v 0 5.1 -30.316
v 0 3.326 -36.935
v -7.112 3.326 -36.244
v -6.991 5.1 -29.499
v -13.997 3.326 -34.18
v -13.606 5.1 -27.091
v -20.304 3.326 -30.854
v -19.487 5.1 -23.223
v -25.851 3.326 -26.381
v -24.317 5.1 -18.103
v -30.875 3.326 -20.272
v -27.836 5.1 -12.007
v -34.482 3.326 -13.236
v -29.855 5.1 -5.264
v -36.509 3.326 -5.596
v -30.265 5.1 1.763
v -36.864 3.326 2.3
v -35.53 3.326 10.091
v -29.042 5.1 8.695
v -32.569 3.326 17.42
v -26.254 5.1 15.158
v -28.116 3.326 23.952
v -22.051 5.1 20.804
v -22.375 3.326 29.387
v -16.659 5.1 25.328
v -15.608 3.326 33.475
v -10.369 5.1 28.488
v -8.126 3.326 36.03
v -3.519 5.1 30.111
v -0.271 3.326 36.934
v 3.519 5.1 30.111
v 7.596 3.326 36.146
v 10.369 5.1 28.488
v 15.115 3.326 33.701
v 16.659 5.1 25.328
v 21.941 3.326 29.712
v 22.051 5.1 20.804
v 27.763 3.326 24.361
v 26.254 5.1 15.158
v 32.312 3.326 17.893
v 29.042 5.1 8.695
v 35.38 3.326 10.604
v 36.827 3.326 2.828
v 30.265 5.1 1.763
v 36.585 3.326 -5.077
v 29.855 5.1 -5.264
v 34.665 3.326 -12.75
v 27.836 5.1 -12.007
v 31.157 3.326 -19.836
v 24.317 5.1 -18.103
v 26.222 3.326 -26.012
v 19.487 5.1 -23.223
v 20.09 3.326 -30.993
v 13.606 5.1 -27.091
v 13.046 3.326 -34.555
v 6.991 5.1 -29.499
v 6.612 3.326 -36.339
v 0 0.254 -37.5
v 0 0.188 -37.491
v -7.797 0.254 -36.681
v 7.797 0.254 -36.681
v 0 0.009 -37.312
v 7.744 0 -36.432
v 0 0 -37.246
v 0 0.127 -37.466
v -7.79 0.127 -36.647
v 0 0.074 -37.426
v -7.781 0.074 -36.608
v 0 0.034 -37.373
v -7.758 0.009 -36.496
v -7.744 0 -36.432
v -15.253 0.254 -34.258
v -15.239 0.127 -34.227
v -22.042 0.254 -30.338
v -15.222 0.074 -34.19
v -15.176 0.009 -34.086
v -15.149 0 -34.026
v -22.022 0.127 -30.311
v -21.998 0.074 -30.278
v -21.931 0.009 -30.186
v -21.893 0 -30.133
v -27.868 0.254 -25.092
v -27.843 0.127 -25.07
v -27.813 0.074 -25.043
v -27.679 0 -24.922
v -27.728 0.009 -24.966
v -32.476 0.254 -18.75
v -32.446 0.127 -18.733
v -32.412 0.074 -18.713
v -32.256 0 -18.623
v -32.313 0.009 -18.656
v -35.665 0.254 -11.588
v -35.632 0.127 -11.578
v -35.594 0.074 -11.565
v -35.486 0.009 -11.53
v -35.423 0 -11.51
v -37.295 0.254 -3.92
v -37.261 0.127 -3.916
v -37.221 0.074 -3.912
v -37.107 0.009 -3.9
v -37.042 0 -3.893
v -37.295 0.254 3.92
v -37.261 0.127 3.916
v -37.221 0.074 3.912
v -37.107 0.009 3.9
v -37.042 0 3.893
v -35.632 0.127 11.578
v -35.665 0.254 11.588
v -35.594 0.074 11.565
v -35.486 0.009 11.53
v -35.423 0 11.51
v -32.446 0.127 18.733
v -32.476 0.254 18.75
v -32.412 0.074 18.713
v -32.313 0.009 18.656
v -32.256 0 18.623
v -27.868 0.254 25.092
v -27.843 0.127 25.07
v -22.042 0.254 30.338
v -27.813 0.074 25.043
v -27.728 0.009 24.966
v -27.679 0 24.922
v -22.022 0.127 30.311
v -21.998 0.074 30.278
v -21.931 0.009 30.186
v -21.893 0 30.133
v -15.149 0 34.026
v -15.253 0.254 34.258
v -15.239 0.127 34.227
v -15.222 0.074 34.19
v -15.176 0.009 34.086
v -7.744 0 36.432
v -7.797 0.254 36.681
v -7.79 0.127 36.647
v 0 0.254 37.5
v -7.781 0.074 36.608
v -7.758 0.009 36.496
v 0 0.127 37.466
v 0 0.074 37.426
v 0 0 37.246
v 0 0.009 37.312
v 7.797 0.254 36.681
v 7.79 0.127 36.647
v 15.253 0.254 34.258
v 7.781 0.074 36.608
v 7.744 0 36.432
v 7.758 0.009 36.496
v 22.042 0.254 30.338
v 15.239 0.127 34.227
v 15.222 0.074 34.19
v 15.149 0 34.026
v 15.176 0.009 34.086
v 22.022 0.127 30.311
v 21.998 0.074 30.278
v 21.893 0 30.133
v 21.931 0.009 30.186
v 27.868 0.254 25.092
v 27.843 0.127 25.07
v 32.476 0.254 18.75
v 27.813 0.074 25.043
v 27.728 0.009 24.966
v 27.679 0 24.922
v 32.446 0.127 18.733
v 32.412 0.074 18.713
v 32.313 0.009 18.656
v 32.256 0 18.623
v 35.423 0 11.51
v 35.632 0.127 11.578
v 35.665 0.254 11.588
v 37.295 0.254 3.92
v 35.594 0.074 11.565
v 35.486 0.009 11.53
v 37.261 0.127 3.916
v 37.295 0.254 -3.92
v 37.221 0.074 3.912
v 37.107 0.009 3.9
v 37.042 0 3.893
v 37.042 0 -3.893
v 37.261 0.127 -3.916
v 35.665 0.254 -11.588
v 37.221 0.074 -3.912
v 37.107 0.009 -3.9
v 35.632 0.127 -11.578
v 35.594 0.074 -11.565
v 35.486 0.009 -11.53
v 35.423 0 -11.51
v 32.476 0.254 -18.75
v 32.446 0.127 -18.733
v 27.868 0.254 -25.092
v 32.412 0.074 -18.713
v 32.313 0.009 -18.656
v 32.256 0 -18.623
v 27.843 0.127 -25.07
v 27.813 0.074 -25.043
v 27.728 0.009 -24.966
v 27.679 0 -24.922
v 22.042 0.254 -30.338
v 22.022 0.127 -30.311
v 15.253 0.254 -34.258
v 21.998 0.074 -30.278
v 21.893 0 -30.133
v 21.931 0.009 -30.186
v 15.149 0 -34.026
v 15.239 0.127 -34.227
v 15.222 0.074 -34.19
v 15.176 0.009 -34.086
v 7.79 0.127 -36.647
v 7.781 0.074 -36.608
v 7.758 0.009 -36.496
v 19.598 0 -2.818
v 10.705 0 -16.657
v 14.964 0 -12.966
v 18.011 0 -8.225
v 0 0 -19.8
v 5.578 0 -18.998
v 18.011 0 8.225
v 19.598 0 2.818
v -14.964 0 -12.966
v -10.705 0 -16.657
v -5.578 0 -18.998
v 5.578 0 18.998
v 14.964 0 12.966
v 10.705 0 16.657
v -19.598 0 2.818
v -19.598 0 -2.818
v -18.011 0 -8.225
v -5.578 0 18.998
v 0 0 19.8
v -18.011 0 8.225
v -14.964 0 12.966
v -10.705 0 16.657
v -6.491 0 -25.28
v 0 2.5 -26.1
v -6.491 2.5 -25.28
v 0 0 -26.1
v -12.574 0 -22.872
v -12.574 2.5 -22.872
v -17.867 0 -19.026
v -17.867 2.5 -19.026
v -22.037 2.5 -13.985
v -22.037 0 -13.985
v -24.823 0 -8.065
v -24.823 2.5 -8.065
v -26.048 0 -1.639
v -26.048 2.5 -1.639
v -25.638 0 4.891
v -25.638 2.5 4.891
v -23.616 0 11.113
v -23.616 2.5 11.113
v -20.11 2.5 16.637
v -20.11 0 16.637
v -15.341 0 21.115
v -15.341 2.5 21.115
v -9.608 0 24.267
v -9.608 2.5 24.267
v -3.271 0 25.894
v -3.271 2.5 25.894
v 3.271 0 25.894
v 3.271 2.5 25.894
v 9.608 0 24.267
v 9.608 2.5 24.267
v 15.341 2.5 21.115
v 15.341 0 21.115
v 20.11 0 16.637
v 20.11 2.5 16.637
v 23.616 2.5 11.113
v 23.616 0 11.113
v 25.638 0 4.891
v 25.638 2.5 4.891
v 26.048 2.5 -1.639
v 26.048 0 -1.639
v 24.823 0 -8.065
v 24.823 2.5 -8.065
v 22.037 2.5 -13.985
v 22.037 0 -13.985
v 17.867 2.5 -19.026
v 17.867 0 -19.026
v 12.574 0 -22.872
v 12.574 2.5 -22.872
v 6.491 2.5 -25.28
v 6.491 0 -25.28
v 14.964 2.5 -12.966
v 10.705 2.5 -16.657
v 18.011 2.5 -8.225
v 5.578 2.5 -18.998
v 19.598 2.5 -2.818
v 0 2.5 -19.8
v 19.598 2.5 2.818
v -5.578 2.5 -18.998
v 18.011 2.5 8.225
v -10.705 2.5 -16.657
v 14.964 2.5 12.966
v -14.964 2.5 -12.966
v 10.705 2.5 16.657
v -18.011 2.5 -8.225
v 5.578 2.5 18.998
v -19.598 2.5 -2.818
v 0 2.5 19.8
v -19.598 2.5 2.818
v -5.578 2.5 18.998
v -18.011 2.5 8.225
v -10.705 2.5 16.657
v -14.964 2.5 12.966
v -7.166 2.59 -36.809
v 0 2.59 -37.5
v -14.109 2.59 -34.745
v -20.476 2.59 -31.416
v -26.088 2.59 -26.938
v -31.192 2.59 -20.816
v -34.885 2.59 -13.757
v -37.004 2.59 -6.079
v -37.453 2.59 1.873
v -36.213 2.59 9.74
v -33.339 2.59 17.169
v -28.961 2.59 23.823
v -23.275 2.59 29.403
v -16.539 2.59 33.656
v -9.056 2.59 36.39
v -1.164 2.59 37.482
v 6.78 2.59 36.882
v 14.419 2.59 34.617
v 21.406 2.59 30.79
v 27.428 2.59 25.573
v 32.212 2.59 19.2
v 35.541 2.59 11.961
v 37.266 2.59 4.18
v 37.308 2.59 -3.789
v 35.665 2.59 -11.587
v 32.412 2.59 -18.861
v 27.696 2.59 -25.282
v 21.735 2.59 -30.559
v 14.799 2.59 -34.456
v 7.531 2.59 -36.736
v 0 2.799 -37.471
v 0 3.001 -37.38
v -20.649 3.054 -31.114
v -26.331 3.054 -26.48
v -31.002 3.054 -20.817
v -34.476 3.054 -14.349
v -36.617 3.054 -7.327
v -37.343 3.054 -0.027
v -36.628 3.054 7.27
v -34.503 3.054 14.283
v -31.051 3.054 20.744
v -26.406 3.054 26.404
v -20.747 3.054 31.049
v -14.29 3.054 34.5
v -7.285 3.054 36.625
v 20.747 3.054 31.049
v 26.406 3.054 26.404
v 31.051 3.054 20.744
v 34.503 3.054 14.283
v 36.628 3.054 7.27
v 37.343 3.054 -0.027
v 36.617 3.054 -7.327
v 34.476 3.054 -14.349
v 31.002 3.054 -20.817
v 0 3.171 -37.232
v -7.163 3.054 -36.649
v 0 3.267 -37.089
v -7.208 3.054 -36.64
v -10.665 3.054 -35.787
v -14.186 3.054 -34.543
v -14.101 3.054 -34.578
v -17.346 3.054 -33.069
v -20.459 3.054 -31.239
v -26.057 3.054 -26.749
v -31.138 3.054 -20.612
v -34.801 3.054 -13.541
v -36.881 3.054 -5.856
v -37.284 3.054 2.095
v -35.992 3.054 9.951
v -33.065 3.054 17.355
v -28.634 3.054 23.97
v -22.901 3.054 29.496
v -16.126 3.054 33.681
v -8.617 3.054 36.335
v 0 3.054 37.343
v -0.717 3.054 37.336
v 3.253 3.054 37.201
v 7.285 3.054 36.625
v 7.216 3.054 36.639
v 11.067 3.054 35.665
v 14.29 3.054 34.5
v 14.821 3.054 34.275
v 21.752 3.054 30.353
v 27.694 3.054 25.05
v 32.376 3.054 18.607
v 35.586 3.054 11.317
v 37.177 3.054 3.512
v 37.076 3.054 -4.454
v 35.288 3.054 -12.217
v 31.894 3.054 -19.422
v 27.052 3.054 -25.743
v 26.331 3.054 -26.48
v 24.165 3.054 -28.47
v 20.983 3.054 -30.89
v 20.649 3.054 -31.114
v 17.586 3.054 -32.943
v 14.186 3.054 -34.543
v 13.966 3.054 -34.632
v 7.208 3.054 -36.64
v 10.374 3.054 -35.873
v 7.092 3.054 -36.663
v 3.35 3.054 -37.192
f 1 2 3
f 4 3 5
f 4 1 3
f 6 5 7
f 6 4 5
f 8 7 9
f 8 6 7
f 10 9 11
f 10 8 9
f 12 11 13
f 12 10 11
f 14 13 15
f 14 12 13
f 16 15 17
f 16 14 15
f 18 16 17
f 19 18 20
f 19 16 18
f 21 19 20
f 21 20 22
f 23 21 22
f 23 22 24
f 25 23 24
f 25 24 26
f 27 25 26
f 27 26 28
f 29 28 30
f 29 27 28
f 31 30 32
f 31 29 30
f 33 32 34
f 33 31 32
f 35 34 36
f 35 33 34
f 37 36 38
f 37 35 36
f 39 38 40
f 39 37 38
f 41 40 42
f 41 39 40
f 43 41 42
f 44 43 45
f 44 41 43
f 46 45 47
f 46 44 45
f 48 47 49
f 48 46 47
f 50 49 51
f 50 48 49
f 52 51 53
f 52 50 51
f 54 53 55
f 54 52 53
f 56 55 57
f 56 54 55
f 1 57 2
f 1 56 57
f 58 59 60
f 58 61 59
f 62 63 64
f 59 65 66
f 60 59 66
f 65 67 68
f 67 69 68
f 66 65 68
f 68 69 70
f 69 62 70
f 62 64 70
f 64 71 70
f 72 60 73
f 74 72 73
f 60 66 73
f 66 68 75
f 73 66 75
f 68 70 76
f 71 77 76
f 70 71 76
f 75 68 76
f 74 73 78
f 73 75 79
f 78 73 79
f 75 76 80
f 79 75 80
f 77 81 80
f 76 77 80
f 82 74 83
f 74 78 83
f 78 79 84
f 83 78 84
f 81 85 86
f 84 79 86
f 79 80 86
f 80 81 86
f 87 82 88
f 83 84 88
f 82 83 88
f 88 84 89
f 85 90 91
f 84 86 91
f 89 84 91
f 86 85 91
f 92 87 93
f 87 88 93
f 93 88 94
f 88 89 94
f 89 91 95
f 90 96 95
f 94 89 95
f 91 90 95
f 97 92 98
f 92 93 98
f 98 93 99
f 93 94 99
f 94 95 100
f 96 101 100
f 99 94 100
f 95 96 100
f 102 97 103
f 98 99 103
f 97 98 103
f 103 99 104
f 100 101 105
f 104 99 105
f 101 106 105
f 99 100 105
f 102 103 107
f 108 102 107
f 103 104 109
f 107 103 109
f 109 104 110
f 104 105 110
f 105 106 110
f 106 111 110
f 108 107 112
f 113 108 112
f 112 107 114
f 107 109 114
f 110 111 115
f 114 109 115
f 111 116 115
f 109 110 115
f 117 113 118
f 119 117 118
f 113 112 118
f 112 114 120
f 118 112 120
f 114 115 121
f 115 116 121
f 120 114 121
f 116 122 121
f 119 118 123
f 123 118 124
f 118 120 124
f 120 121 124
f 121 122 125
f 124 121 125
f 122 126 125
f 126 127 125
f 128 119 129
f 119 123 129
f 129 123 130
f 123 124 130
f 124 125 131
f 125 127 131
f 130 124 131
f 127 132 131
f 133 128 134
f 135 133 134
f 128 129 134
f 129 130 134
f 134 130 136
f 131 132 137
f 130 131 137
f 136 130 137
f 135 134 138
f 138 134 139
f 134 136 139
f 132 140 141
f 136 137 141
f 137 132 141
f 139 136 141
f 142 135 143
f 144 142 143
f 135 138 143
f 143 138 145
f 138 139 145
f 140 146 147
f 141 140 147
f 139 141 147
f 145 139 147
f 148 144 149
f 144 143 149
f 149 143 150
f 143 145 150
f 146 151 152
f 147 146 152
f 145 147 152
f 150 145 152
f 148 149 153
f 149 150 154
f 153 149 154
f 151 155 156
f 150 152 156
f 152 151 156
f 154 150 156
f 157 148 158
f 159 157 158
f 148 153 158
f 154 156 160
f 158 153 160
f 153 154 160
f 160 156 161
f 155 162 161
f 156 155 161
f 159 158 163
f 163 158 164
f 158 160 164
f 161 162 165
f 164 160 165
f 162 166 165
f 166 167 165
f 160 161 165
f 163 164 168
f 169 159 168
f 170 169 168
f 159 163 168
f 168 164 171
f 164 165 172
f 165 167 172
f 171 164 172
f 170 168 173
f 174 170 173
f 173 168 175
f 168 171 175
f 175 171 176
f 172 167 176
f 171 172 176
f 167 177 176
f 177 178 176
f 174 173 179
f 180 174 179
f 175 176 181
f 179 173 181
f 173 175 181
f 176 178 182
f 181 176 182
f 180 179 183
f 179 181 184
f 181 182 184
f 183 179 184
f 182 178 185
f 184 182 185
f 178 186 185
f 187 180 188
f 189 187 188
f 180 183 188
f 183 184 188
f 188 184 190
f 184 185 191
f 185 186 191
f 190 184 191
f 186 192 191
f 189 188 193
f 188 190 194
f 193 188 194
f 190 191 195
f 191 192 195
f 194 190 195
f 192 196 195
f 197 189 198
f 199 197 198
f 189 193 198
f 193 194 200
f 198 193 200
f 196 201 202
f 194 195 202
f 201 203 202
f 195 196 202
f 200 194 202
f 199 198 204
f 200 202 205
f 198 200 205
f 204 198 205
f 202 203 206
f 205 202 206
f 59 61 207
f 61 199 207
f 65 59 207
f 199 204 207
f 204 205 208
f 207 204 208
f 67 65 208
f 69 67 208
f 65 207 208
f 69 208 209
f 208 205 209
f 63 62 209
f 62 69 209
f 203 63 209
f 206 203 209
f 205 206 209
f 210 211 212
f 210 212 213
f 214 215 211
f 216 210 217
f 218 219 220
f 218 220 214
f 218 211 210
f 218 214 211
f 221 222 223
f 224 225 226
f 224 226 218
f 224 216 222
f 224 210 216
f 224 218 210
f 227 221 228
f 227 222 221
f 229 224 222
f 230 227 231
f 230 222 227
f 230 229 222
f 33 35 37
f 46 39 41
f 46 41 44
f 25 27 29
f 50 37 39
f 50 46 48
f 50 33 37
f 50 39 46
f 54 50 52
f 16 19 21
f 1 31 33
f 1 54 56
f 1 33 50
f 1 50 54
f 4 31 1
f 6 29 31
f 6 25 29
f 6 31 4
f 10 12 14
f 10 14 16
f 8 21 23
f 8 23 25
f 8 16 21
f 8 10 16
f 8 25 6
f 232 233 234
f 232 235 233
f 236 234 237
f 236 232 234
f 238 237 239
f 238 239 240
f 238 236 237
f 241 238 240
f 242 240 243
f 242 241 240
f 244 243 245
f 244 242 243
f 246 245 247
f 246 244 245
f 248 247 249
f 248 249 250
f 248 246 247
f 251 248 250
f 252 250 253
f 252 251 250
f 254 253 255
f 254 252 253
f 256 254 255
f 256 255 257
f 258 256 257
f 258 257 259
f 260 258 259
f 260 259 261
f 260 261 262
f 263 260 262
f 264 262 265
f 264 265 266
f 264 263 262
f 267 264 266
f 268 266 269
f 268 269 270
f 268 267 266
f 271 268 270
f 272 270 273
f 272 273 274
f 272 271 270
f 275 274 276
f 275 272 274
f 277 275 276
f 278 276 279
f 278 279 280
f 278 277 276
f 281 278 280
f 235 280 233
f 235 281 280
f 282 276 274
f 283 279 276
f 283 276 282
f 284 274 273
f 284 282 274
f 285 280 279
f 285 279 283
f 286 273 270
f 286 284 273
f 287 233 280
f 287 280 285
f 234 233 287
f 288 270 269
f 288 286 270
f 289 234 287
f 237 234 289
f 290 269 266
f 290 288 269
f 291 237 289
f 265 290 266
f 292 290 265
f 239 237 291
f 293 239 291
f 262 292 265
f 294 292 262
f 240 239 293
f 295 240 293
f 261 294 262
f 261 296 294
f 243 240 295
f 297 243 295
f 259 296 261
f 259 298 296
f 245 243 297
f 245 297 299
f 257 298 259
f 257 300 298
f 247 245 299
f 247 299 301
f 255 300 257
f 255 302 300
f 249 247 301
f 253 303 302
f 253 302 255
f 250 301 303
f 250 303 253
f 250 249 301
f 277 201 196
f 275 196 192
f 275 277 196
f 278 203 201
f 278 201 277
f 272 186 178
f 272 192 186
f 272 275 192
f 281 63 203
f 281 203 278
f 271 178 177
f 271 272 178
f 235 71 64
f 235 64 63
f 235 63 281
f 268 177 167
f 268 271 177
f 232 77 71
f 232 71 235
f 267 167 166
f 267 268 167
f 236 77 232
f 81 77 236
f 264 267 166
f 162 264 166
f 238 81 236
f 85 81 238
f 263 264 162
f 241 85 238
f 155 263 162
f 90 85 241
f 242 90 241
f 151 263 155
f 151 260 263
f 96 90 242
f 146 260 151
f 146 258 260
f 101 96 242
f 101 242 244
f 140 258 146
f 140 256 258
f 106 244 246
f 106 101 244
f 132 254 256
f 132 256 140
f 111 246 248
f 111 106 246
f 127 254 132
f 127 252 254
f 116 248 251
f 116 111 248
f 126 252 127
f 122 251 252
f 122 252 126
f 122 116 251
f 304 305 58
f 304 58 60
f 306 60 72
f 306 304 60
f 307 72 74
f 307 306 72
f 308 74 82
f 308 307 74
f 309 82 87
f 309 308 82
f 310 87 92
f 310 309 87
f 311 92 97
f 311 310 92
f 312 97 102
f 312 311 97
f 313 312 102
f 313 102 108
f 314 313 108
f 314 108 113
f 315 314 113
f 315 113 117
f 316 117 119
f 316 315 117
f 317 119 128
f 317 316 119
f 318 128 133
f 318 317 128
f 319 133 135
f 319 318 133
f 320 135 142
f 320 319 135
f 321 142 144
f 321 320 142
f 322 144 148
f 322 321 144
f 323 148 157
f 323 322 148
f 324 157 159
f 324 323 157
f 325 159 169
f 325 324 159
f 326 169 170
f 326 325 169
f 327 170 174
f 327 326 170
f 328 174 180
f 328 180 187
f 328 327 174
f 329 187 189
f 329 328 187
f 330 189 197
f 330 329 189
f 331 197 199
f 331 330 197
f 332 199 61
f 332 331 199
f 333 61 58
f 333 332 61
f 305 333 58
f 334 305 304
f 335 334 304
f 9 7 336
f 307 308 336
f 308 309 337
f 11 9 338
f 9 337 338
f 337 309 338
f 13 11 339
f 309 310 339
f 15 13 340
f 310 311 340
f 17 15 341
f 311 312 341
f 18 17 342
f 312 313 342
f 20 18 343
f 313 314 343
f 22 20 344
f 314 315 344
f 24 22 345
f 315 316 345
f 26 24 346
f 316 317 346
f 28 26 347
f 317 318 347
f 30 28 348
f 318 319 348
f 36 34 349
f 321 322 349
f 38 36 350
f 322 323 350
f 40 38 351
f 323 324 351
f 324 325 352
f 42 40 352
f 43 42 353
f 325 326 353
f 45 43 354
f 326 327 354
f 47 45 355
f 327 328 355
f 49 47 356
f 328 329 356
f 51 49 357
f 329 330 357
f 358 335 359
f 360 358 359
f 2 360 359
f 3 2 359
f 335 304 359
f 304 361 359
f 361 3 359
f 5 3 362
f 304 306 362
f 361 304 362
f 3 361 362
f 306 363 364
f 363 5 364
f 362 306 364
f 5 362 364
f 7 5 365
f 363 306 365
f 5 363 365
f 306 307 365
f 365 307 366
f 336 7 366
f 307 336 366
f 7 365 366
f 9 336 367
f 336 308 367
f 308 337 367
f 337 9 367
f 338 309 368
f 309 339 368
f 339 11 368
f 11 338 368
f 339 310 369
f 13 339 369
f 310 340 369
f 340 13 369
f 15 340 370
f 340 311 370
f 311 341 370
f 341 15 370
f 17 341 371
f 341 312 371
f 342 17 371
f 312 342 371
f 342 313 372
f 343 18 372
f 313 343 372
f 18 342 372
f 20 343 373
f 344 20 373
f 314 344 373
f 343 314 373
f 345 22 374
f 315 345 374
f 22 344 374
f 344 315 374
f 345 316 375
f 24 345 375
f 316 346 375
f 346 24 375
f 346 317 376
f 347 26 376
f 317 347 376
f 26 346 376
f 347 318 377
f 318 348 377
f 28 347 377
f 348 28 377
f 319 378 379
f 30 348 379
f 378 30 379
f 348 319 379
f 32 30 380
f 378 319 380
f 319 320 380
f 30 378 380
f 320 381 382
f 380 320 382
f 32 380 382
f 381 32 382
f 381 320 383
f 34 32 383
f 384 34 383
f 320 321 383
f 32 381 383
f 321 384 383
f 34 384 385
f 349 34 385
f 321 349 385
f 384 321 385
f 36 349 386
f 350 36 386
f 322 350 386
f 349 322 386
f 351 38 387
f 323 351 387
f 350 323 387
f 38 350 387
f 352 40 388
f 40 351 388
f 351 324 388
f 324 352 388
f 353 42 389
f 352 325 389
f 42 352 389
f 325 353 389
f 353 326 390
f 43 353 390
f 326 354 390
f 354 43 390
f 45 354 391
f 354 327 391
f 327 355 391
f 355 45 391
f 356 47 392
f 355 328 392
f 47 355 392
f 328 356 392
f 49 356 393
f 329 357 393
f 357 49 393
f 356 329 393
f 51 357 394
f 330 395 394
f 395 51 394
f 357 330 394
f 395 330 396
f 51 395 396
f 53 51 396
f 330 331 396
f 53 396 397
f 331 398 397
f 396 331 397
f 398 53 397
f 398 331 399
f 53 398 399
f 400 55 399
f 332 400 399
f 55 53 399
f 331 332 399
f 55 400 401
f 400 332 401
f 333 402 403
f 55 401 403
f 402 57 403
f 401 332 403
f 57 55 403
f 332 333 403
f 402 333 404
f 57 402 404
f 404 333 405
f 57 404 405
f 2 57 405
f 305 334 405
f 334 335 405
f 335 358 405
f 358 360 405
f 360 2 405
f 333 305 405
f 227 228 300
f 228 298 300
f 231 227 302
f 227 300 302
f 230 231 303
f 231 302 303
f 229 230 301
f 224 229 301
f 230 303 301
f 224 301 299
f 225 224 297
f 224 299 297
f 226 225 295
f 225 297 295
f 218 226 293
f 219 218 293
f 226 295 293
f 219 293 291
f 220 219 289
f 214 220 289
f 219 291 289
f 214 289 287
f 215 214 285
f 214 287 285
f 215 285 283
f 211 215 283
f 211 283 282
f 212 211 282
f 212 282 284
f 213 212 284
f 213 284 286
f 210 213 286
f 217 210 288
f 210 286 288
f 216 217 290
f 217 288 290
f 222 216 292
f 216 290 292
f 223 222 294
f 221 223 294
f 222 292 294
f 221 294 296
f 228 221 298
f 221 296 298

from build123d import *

# Parameters (mm, degrees)
SKETCH2_W = 19.8
SKETCH2_H = 2.5
FILLET1_R = 0.762
FILLET2_R = 0.254


with BuildPart() as part:
    # Sketch1 → Flange (revolve)
    with BuildSketch(Plane(origin=(0, 0, 0), x_dir=(0, 0, -1), z_dir=(1, 0, 0)), mode=Mode.PRIVATE) as flange_sk:
        Polygon((-37.5, 0), (-37.5, 3.175), (-30.315802195, 5.1), (0, 5.1), (0, 2.5), (-26.1, 2.5), (-26.1, 0), align=None)
    revolve(flange_sk.sketch.rotate(Axis((0, 0, 0), (0, 1, 0)), 180), axis=Axis((0, 0, 0), (0, 1, 0)))

    # Sketch2 → Blank Insert (revolve)
    with BuildSketch(Plane(origin=(0, 0, 0), x_dir=(0, 0, -1), z_dir=(1, 0, 0))):
        with Locations((-9.9, 1.25)):
            Rectangle(SKETCH2_W, SKETCH2_H)
    revolve(axis=Axis((0, 0, 0), (0, -1, 0)))

    # Fillet1
    fillet1_edges = [part.edges().sort_by_distance(p)[0] for p in [
        (0, 3.175, 37.5),
    ]]
    fillet(fillet1_edges, radius=FILLET1_R)

    # Fillet2
    fillet2_edges = [part.edges().sort_by_distance(p)[0] for p in [
        (0, 0, 37.5),
    ]]
    fillet(fillet2_edges, radius=FILLET2_R)


solid = part.part
